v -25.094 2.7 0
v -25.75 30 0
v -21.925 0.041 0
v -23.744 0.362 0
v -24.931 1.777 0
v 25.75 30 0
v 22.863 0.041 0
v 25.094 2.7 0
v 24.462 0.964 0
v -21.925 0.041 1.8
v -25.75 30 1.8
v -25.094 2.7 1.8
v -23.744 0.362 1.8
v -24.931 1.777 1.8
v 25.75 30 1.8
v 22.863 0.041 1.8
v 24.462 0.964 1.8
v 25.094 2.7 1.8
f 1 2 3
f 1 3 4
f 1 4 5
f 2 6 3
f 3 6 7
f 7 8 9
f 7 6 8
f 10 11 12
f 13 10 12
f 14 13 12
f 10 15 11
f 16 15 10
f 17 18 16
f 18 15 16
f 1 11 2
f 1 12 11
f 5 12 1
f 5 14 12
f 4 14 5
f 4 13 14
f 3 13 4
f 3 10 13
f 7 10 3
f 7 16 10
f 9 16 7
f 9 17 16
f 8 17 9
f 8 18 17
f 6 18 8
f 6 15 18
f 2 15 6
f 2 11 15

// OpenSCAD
// Parameters for the trapezoidal plate
short_side = 50.188; // Length of the shorter side
long_side = 51.5;  // Length of the longer side
height = 30.0;     // Height of the trapezoid
thickness = 1.8;   // Thickness of the plate
corner_radius = 2.7; // Radius of the rounded corners

module symetrical_trapezoid_2d(short, long, h, corner_radius) {
    hull() {
        // Sharp bottom corners
        polygon(points=[
            [-(short / 2), corner_radius],
            [(short / 2), corner_radius],
            [(long / 2), h],
            [-(long / 2), h]
        ]);
        
        // Rounded bottom left corner
        translate([-(short / 2) + corner_radius, corner_radius])
            circle(r = corner_radius);
        
        // Rounded bottom right corner
        translate([(short / 2) - corner_radius, corner_radius])
            circle(r = corner_radius);
    }
}

// Example usage
linear_extrude(height=thickness)
        symetrical_trapezoid_2d(
                short_side, // = 50, 
                long_side, // = 100, 
                height, // = 40, 
                corner_radius// = 5
        );
